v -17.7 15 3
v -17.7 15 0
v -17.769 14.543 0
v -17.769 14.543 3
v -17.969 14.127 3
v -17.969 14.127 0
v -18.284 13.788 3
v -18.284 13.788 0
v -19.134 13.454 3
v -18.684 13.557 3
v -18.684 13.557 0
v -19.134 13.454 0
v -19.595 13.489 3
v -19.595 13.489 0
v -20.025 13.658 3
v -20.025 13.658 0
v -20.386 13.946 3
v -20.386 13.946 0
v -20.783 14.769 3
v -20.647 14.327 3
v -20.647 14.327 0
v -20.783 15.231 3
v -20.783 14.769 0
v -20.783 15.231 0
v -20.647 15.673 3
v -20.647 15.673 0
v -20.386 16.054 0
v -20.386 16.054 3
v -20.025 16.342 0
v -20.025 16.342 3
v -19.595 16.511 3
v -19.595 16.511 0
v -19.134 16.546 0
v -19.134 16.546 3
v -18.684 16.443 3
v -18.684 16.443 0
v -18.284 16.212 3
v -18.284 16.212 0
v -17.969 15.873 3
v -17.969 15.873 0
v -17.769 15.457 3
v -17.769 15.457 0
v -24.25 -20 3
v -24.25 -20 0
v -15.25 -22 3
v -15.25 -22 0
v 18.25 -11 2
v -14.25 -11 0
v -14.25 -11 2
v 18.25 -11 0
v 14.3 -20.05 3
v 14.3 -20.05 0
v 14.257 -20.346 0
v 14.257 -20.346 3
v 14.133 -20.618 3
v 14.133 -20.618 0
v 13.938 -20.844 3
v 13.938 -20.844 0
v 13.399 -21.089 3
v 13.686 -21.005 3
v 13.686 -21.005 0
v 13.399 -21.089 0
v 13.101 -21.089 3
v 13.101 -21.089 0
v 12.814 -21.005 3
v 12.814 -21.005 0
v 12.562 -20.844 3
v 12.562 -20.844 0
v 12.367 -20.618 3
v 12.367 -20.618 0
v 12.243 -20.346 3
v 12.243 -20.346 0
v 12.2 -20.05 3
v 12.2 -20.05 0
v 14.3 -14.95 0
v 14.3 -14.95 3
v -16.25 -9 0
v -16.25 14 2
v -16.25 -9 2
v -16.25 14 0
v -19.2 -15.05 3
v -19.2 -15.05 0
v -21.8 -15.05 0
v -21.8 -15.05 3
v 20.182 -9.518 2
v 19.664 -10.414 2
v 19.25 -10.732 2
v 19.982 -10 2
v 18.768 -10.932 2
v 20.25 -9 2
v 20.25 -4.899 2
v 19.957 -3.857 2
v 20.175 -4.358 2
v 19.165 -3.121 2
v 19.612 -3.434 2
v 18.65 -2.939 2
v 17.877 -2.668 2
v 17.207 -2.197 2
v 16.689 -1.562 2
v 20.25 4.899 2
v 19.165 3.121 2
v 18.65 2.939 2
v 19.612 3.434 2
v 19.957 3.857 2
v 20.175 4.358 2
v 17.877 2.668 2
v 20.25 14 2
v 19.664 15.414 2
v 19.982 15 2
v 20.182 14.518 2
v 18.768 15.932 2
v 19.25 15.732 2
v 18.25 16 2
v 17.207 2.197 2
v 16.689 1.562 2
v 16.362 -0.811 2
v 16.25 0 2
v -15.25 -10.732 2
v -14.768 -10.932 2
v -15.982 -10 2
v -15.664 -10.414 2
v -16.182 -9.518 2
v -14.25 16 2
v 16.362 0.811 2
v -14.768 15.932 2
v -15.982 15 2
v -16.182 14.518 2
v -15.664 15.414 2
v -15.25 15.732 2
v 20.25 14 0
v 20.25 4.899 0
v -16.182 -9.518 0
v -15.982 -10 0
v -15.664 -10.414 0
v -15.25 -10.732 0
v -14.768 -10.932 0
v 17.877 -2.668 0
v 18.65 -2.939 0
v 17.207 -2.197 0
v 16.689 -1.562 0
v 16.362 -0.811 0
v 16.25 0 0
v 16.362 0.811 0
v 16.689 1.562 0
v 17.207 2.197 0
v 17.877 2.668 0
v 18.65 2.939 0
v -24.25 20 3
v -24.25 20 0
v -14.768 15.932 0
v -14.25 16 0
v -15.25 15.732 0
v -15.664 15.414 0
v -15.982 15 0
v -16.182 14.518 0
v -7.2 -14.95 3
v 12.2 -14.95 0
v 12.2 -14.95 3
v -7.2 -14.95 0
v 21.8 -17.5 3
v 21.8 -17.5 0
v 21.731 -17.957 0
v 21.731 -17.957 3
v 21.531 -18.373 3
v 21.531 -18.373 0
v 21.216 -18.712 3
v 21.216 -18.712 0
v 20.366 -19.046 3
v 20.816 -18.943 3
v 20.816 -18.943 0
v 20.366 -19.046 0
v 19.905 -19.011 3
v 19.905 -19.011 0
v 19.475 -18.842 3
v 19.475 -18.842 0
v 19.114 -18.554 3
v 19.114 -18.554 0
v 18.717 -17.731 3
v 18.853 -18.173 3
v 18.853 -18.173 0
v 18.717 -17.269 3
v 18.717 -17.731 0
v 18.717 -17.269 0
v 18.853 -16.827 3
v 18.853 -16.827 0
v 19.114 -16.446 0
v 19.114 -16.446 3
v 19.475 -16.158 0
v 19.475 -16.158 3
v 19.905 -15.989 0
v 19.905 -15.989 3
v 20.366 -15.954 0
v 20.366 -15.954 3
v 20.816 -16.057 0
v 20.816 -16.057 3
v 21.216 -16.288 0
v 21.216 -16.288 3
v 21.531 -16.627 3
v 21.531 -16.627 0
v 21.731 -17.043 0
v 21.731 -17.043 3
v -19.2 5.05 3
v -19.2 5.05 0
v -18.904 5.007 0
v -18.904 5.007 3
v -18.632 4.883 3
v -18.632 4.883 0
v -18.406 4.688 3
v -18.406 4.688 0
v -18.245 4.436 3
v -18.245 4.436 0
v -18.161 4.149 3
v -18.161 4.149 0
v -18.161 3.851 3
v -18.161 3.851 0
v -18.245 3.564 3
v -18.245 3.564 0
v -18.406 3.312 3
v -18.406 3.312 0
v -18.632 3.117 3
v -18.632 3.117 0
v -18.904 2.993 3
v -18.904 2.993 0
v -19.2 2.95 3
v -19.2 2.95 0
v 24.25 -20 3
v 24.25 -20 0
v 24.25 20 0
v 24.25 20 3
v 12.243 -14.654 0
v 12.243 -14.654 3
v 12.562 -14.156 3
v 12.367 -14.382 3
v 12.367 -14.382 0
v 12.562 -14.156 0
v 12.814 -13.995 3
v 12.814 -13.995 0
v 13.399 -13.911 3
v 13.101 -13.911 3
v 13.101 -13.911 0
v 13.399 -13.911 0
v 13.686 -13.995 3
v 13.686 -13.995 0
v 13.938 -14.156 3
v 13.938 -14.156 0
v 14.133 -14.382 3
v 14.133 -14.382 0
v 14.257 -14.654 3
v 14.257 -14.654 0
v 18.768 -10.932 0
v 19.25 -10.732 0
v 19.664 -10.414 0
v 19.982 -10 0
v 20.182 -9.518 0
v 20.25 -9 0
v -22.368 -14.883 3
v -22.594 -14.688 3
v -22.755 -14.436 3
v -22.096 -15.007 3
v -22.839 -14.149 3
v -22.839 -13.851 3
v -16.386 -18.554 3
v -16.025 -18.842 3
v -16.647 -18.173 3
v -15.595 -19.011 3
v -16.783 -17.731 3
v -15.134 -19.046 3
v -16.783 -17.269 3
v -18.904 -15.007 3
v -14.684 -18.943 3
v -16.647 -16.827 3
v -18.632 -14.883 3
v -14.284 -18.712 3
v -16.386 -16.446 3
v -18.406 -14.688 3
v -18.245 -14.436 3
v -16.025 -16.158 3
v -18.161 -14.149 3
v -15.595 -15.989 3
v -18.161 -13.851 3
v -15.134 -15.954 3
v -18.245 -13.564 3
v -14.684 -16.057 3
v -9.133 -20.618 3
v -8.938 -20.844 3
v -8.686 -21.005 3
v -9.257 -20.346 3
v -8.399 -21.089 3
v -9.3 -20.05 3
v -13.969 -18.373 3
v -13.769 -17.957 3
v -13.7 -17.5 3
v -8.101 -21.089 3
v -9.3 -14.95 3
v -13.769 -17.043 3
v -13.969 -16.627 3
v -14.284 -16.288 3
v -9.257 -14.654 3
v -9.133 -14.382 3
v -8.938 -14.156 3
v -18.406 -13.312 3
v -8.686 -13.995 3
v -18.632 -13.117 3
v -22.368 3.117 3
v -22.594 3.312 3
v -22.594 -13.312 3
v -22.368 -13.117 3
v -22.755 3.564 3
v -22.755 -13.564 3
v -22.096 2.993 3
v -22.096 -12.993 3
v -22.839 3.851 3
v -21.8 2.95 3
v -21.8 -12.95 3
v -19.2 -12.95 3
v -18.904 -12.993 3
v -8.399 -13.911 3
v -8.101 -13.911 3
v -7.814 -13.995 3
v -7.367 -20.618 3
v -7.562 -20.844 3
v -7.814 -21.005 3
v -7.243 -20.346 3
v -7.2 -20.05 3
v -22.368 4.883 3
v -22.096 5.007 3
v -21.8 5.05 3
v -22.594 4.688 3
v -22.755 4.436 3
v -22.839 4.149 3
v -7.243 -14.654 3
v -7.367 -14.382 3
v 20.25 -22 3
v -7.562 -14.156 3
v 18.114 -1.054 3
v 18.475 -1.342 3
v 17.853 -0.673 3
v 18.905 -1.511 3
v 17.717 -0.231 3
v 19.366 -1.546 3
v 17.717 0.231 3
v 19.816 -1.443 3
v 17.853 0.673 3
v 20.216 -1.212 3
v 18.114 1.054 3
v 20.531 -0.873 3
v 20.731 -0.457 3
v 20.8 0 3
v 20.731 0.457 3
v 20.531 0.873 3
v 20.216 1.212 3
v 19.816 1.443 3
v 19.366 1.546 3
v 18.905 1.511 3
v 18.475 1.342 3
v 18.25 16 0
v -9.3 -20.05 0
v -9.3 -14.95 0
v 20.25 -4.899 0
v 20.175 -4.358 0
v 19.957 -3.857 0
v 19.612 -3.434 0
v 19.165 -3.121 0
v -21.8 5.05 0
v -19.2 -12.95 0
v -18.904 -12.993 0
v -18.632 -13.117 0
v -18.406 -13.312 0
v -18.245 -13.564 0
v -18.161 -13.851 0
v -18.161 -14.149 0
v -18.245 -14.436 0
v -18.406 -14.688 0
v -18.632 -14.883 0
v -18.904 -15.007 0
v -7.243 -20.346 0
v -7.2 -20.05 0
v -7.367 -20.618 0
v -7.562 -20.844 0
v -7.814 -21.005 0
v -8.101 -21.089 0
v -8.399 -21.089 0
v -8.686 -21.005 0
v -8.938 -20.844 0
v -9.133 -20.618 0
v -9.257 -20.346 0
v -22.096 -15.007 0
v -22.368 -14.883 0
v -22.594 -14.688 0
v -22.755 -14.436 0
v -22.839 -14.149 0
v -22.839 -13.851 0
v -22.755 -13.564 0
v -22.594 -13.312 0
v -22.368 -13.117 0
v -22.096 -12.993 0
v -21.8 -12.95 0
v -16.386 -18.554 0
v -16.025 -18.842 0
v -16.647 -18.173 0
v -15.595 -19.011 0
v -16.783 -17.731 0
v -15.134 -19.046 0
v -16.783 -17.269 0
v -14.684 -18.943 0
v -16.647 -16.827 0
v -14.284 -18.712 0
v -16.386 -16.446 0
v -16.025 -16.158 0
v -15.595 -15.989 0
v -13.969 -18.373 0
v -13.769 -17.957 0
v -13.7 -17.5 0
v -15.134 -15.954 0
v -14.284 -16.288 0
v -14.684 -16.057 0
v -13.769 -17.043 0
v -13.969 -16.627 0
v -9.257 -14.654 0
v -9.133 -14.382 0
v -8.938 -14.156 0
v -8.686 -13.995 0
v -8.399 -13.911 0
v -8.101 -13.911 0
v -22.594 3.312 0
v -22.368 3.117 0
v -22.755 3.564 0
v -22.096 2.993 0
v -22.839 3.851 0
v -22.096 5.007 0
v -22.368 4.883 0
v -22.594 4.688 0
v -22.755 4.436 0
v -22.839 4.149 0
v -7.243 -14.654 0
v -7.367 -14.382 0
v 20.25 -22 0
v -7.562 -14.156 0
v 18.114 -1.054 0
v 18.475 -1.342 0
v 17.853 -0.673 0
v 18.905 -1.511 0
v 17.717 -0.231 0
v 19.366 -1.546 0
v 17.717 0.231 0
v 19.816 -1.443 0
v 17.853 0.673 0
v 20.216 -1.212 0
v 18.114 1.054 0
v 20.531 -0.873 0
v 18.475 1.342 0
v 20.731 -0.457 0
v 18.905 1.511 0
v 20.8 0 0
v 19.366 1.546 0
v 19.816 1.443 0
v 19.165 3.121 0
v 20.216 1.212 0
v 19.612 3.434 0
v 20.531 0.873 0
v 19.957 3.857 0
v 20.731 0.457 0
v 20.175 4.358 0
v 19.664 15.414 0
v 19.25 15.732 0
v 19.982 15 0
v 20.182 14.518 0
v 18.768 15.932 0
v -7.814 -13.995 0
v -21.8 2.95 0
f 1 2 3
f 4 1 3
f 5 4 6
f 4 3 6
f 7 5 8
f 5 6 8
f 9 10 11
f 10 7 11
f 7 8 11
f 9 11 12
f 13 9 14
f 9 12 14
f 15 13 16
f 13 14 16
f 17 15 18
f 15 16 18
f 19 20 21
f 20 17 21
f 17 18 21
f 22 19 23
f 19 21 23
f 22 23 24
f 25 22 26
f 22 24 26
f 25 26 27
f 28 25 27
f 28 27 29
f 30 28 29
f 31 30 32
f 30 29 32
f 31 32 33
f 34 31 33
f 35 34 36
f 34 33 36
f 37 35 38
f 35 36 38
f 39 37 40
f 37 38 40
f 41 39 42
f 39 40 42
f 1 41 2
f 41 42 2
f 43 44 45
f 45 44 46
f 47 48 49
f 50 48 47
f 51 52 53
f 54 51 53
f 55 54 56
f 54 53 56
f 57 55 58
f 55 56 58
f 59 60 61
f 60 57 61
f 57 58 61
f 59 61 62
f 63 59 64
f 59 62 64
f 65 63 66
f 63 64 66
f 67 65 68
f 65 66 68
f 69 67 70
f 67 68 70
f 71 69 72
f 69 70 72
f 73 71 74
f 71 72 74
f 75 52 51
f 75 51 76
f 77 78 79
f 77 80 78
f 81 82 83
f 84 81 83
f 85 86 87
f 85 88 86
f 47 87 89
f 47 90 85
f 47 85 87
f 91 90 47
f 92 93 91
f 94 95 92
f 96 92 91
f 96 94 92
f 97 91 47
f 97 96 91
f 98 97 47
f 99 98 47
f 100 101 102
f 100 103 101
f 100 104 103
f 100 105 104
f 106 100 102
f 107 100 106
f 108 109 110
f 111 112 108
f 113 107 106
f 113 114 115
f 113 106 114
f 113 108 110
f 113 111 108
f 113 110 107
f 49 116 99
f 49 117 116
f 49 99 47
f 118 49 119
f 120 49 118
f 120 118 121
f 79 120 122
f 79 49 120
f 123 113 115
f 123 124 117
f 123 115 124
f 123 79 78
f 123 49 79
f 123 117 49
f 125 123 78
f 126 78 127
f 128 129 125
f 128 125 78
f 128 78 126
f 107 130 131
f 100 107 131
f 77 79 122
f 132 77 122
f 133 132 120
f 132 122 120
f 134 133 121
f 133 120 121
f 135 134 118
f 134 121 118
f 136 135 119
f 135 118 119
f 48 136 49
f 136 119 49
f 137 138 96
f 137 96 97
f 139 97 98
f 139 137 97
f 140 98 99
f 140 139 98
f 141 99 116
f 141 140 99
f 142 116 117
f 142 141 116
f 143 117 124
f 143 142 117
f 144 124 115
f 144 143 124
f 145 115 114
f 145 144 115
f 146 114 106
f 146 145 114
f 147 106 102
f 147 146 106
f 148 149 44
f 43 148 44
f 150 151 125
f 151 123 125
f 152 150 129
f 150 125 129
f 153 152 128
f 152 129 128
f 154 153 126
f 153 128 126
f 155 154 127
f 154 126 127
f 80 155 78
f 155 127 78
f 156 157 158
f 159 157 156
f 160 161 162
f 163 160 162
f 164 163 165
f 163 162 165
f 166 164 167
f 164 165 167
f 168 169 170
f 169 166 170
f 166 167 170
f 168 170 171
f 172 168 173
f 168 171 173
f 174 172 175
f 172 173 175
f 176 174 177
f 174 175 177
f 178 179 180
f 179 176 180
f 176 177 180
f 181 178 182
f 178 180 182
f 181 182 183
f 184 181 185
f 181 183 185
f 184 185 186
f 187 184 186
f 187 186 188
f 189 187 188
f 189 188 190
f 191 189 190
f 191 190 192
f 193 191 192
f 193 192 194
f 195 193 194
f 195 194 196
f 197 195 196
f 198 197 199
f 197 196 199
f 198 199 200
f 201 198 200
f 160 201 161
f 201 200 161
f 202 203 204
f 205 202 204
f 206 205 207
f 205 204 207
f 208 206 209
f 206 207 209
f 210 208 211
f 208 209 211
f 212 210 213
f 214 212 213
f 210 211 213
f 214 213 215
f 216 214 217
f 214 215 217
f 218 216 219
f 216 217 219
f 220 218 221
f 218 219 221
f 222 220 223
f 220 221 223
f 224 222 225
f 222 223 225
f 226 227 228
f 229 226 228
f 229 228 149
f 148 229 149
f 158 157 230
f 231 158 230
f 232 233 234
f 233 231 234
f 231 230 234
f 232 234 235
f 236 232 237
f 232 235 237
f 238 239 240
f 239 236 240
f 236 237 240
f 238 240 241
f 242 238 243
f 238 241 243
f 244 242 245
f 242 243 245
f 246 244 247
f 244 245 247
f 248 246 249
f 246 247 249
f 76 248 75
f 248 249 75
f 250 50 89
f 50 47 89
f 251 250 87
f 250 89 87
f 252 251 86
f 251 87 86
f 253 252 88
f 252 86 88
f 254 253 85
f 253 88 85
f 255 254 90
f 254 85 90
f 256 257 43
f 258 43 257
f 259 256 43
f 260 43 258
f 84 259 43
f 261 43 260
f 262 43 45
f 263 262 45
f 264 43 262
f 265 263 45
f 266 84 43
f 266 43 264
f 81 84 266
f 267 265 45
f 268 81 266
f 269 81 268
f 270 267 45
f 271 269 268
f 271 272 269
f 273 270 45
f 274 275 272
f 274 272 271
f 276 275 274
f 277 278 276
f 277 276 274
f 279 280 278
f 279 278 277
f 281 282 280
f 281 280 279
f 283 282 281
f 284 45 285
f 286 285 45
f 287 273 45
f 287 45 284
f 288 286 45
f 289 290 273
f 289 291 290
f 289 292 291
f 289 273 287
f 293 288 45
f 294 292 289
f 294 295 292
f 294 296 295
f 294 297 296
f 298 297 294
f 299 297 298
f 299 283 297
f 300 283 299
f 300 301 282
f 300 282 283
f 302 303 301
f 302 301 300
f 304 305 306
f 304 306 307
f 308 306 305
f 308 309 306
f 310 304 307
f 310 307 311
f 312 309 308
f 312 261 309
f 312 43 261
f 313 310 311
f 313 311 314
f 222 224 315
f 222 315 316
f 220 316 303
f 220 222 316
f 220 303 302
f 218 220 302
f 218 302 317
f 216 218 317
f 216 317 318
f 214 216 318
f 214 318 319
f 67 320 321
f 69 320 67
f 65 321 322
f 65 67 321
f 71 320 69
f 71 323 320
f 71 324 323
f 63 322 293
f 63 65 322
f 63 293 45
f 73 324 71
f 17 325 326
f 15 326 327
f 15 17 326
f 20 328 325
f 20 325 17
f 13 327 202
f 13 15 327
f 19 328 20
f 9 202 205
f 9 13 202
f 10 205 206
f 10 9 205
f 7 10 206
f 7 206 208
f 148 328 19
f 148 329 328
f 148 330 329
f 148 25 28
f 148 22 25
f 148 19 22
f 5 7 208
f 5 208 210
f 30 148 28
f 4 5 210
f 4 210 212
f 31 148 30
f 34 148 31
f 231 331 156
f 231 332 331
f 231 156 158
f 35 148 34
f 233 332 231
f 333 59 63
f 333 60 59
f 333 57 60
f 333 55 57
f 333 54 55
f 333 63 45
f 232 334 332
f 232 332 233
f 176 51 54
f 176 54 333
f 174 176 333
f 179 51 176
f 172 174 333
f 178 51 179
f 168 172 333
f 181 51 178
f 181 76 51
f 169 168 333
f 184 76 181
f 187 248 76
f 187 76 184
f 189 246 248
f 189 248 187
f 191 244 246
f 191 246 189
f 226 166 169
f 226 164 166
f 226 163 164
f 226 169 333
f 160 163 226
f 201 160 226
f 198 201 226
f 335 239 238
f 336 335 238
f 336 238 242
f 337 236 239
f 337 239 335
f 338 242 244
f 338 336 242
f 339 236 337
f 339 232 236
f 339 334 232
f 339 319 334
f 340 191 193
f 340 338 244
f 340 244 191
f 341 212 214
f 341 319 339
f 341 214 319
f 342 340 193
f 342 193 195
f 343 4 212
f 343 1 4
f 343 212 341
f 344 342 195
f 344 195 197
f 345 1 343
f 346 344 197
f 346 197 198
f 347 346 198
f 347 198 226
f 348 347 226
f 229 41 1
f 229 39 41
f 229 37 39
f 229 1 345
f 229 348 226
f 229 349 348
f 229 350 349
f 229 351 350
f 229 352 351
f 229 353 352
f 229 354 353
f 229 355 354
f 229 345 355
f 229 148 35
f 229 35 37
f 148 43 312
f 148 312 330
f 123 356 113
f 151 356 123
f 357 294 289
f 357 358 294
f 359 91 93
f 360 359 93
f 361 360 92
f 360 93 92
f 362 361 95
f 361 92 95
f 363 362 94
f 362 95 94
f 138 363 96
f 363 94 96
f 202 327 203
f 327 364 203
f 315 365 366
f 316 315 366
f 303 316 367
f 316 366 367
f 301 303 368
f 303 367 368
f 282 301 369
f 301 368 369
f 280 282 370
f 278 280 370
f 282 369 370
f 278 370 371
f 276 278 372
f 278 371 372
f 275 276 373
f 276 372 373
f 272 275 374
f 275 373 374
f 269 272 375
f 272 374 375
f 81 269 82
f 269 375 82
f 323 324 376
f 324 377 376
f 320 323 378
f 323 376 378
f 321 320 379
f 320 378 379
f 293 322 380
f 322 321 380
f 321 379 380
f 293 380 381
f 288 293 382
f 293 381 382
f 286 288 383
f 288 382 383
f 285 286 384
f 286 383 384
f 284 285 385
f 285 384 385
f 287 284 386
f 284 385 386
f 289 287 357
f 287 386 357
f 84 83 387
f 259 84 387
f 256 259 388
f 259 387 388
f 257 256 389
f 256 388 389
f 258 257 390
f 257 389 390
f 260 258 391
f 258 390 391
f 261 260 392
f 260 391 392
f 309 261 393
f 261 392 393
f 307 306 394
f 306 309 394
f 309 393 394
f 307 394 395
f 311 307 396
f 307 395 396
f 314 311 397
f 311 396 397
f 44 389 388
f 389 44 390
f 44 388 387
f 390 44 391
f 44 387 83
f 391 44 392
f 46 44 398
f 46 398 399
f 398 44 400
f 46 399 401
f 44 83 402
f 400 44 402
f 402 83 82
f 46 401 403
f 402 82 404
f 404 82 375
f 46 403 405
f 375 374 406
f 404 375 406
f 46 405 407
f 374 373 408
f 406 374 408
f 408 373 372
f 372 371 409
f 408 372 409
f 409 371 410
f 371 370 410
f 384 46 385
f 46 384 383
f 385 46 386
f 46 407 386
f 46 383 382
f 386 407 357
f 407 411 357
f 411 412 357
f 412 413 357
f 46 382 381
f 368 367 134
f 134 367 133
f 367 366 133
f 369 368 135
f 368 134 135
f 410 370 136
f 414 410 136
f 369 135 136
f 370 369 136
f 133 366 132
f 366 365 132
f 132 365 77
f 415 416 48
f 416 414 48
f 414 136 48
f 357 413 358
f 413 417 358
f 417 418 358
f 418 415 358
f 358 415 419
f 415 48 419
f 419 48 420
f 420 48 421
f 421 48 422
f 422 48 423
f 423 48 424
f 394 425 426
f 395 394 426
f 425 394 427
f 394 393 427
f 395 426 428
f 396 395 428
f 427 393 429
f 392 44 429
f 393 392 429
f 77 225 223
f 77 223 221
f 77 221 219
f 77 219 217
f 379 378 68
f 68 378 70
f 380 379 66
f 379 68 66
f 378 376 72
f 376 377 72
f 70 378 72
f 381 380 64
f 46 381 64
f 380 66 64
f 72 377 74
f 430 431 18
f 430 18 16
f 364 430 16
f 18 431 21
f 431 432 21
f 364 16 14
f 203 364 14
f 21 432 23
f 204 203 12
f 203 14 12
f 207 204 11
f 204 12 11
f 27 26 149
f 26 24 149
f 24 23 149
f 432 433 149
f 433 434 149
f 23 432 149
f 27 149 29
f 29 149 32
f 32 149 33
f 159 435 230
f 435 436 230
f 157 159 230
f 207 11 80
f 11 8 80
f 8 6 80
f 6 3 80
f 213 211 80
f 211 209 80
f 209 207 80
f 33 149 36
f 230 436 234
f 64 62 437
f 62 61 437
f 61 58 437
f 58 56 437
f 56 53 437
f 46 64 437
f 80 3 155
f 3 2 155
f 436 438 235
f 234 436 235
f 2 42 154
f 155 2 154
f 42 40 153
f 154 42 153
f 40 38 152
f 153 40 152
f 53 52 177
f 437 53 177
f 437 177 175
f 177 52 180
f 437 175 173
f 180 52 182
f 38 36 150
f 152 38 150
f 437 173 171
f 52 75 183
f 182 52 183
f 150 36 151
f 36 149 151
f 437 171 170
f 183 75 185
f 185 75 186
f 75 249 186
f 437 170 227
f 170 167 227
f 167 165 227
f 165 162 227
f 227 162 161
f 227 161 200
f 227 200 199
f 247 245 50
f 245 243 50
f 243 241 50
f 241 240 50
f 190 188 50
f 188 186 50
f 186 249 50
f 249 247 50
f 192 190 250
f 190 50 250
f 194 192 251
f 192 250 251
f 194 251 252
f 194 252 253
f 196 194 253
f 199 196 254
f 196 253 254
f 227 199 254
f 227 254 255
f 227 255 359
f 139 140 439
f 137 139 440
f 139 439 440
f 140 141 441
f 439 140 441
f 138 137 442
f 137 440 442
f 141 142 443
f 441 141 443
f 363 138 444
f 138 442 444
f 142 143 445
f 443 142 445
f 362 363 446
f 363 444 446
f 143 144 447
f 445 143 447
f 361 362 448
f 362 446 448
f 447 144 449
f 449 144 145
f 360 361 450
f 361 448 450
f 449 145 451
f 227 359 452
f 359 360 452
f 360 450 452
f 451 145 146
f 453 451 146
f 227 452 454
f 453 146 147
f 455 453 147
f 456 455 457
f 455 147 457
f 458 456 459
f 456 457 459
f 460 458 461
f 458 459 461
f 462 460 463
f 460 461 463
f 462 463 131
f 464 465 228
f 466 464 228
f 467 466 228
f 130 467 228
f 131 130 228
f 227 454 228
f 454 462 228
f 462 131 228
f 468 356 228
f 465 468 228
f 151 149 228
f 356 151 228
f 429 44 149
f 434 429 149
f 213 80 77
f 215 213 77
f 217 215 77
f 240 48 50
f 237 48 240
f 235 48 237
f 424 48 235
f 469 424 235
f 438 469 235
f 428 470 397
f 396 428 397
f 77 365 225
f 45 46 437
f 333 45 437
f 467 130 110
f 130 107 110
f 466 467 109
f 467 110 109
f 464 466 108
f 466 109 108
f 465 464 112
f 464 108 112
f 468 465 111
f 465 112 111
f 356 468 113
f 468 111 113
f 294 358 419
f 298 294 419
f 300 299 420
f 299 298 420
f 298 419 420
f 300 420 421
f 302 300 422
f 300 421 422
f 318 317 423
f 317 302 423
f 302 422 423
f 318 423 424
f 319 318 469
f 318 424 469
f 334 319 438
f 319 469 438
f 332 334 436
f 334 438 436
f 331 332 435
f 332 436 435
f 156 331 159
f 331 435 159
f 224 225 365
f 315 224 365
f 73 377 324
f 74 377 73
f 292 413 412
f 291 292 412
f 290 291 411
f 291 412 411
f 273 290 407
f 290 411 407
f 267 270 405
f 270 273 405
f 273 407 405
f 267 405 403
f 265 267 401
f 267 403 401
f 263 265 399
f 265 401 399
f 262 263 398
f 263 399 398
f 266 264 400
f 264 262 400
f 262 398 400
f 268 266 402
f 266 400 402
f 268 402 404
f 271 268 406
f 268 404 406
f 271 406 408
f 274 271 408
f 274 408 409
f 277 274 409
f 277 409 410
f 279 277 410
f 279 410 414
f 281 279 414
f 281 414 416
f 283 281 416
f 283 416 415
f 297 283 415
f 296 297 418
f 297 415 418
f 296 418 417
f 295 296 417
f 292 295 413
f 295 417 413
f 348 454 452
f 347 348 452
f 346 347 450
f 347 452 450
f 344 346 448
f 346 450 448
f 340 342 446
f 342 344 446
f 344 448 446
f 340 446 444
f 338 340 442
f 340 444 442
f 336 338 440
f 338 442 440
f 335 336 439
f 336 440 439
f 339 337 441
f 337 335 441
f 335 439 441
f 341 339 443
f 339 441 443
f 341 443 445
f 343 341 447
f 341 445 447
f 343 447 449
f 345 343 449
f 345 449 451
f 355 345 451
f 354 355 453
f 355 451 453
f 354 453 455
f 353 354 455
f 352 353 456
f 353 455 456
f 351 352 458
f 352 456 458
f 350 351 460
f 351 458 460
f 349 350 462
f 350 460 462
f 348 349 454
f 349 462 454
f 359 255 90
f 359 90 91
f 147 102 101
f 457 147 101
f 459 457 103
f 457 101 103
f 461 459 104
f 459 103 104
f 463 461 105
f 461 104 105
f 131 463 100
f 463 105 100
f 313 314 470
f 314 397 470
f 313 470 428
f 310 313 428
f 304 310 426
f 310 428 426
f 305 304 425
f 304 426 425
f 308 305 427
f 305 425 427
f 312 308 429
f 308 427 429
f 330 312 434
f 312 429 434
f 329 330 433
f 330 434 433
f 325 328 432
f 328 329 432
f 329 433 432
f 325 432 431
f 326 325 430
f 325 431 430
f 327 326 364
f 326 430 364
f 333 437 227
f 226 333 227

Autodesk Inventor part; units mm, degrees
ref_plane "YZ Plane" through (0, 0, 0) normal (1, 0, 0) x (0, 1, 0)
ref_plane "XZ Plane" through (0, 0, 0) normal (0, 1, 0) x (-1, 0, 0)
ref_plane "XY Plane" through (0, 0, 0) normal (0, 0, 1) x (1, 0, 0)
sketch "スケッチ1" plane through (0, 0, 0) normal (0, 0, 1) x (1, 0, 0)
  line L0 (-24.25, -20) -> (24.25, -20) construction
  line L1 (24.25, -20) -> (24.25, 20)
  line L2 (24.25, 20) -> (-24.25, 20)
  line L3 (-24.25, 20) -> (-24.25, -20)
  line L4 (-24.25, -20) -> (24.25, 20) construction
  line L5 (24.25, -20) -> (-24.25, 20) construction
  circle A0 centre (-15.25, -17.5) radius 1.55
  circle A1 centre (20.25, -17.5) radius 1.55
  line L6 (-9.25, -15) -> (14.25, -15) construction
  line L7 (14.25, -15) -> (14.25, -20) construction
  line L8 (14.25, -20) -> (-9.25, -20) construction
  line L9 (-9.25, -20) -> (-9.25, -15) construction
  line L10 (-24.25, -20) -> (-15.25, -22)
  line L11 (-15.25, -22) -> (20.25, -22)
  line L12 (20.25, -22) -> (24.25, -20)
  line L13 (14.3, -14.95) -> (-9.3, -14.95)
  line L14 (-9.3, -14.95) -> (-9.3, -20.05)
  line L15 (-9.3, -20.05) -> (14.3, -20.05)
  line L16 (14.3, -20.05) -> (14.3, -14.95)
  circle A2 centre (-8.25, -14.95) radius 1.05
  circle A3 centre (-8.25, -20.05) radius 1.05
  circle A4 centre (13.25, -14.95) radius 1.05
  circle A5 centre (13.25, -20.05) radius 1.05
  circle A6 centre (-19.25, 15) radius 1.55
  line L17 (-21.8, 5.05) -> (-19.2, 5.05)
  line L18 (-19.2, 5.05) -> (-19.2, -15.05)
  line L19 (-19.2, -15.05) -> (-21.8, -15.05)
  line L20 (-21.8, -15.05) -> (-21.8, 5.05)
  line L21 (-19.25, 5) -> (-21.75, 5) construction
  line L22 (-21.75, 5) -> (-21.75, -15) construction
  line L23 (-21.75, -15) -> (-19.25, -15) construction
  line L24 (-19.25, -15) -> (-19.25, 5) construction
  line L25 (2.5, -14.95) -> (2.5, -20.05) construction
  circle A7 centre (19.25, 0) radius 1.55
  line L26 (-19.25, 15) -> (19.25, 15) construction
  line L27 (19.25, 15) -> (19.25, 0) construction
  circle A8 centre (-21.8, 4) radius 1.05
  circle A9 centre (-19.2, 4) radius 1.05
  circle A10 centre (-21.8, -14) radius 1.05
  circle A11 centre (-19.2, -14) radius 1.05
  point P0 (0, 0)
  point P1 (-9.25, -17.5)
  dimension "d10" = 2.1
  dimension "d26" = 2.1
  dimension "d0" = 5
  dimension "d3" = 3.1
  dimension "d4" = 35.5
  dimension "d5" = 2
  dimension "d7" = 40
  dimension "d8" = 23.5
  dimension "d9" = 0.05
  dimension "d11" = 3.1
  dimension "d12" = 5
  dimension "d13" = 5
  dimension "d14" = 0.05
  dimension "d15" = 17.75
  dimension "d16" = 48.5
  dimension "d17" = 4
  dimension "d18" = 5
  dimension "d19" = 20
  dimension "d20" = 2.5
  dimension "d21" = 2.5
  dimension "d22" = 5
  dimension "d23" = 15
  dimension "d27" = 25
extrude "押し出し1" add sketch "スケッチ1" along normal blind 3
sketch "スケッチ2" plane through (0, 0, 0) normal (0, 0, -1) x (-1, 0, 0)
  line L0 (-14.3, -20.05) -> (-14.3, -14.95) projected
  line L1 (-12.2, -14.95) -> (7.2, -14.95) projected
  line L2 (24.25, 20) -> (-24.25, 20) projected
  line L3 (-24.25, 20) -> (-24.25, -20) projected
  line L4 (21.8, -15.05) -> (19.2, -15.05) projected
  line L5 (19.2, -12.95) -> (19.2, 2.95) projected
  line L6 (19.2, 5.05) -> (21.8, 5.05) projected
  circle A0 centre (-19.25, 0) radius 1.55 projected
  line L7 (-20.25, 16) -> (16.25, 16)
  line L8 (16.25, 16) -> (16.25, -11)
  line L9 (16.25, -11) -> (-20.25, -11)
  line L10 (-20.25, -11) -> (-20.25, -2.8284)
  line L11 (-20.25, 16) -> (-20.25, 2.8284)
  arc A1 (-20.25, -2.8284) -> (-20.25, 2.8284) centre (-19.25, 0) ccw
  line L12 (19.25, 5.05) -> (19.25, -15.05) construction
  line L13 (19.2, -15.05) -> (21.8, -15.05) projected
  line L14 (-14.3, -15) -> (9.3, -15) construction
  line L15 (9.3, -20.05) -> (9.3, -14.95) projected
  point P0 (0, 0)
  dimension "d28" = 3
  dimension "d29" = 4
  dimension "d30" = 4
  dimension "d31" = 0.05
  dimension "d32" = 3
  dimension "d33" = 0.05
  dimension "d34" = 4
extrude "押し出し2" cut sketch "スケッチ2" against normal blind 2 contours L7 L8 L9 L10 A1 L11
fillet "フィレット1" radius 2 6 edges at (20.25, 2.8284, 1) (20.25, -2.8284, 1) (20.25, 16, 1) (-16.25, 16, 1) (-16.25, -11, 1) (20.25, -11, 1)
equation "\"d13\" = d12"
equation "\"d15\" = 0.5 * d4"
equation "\"d18\" = d13"
properties part number "コックピット_サブフレーム_1_5" material "アセタール樹脂、黒"
